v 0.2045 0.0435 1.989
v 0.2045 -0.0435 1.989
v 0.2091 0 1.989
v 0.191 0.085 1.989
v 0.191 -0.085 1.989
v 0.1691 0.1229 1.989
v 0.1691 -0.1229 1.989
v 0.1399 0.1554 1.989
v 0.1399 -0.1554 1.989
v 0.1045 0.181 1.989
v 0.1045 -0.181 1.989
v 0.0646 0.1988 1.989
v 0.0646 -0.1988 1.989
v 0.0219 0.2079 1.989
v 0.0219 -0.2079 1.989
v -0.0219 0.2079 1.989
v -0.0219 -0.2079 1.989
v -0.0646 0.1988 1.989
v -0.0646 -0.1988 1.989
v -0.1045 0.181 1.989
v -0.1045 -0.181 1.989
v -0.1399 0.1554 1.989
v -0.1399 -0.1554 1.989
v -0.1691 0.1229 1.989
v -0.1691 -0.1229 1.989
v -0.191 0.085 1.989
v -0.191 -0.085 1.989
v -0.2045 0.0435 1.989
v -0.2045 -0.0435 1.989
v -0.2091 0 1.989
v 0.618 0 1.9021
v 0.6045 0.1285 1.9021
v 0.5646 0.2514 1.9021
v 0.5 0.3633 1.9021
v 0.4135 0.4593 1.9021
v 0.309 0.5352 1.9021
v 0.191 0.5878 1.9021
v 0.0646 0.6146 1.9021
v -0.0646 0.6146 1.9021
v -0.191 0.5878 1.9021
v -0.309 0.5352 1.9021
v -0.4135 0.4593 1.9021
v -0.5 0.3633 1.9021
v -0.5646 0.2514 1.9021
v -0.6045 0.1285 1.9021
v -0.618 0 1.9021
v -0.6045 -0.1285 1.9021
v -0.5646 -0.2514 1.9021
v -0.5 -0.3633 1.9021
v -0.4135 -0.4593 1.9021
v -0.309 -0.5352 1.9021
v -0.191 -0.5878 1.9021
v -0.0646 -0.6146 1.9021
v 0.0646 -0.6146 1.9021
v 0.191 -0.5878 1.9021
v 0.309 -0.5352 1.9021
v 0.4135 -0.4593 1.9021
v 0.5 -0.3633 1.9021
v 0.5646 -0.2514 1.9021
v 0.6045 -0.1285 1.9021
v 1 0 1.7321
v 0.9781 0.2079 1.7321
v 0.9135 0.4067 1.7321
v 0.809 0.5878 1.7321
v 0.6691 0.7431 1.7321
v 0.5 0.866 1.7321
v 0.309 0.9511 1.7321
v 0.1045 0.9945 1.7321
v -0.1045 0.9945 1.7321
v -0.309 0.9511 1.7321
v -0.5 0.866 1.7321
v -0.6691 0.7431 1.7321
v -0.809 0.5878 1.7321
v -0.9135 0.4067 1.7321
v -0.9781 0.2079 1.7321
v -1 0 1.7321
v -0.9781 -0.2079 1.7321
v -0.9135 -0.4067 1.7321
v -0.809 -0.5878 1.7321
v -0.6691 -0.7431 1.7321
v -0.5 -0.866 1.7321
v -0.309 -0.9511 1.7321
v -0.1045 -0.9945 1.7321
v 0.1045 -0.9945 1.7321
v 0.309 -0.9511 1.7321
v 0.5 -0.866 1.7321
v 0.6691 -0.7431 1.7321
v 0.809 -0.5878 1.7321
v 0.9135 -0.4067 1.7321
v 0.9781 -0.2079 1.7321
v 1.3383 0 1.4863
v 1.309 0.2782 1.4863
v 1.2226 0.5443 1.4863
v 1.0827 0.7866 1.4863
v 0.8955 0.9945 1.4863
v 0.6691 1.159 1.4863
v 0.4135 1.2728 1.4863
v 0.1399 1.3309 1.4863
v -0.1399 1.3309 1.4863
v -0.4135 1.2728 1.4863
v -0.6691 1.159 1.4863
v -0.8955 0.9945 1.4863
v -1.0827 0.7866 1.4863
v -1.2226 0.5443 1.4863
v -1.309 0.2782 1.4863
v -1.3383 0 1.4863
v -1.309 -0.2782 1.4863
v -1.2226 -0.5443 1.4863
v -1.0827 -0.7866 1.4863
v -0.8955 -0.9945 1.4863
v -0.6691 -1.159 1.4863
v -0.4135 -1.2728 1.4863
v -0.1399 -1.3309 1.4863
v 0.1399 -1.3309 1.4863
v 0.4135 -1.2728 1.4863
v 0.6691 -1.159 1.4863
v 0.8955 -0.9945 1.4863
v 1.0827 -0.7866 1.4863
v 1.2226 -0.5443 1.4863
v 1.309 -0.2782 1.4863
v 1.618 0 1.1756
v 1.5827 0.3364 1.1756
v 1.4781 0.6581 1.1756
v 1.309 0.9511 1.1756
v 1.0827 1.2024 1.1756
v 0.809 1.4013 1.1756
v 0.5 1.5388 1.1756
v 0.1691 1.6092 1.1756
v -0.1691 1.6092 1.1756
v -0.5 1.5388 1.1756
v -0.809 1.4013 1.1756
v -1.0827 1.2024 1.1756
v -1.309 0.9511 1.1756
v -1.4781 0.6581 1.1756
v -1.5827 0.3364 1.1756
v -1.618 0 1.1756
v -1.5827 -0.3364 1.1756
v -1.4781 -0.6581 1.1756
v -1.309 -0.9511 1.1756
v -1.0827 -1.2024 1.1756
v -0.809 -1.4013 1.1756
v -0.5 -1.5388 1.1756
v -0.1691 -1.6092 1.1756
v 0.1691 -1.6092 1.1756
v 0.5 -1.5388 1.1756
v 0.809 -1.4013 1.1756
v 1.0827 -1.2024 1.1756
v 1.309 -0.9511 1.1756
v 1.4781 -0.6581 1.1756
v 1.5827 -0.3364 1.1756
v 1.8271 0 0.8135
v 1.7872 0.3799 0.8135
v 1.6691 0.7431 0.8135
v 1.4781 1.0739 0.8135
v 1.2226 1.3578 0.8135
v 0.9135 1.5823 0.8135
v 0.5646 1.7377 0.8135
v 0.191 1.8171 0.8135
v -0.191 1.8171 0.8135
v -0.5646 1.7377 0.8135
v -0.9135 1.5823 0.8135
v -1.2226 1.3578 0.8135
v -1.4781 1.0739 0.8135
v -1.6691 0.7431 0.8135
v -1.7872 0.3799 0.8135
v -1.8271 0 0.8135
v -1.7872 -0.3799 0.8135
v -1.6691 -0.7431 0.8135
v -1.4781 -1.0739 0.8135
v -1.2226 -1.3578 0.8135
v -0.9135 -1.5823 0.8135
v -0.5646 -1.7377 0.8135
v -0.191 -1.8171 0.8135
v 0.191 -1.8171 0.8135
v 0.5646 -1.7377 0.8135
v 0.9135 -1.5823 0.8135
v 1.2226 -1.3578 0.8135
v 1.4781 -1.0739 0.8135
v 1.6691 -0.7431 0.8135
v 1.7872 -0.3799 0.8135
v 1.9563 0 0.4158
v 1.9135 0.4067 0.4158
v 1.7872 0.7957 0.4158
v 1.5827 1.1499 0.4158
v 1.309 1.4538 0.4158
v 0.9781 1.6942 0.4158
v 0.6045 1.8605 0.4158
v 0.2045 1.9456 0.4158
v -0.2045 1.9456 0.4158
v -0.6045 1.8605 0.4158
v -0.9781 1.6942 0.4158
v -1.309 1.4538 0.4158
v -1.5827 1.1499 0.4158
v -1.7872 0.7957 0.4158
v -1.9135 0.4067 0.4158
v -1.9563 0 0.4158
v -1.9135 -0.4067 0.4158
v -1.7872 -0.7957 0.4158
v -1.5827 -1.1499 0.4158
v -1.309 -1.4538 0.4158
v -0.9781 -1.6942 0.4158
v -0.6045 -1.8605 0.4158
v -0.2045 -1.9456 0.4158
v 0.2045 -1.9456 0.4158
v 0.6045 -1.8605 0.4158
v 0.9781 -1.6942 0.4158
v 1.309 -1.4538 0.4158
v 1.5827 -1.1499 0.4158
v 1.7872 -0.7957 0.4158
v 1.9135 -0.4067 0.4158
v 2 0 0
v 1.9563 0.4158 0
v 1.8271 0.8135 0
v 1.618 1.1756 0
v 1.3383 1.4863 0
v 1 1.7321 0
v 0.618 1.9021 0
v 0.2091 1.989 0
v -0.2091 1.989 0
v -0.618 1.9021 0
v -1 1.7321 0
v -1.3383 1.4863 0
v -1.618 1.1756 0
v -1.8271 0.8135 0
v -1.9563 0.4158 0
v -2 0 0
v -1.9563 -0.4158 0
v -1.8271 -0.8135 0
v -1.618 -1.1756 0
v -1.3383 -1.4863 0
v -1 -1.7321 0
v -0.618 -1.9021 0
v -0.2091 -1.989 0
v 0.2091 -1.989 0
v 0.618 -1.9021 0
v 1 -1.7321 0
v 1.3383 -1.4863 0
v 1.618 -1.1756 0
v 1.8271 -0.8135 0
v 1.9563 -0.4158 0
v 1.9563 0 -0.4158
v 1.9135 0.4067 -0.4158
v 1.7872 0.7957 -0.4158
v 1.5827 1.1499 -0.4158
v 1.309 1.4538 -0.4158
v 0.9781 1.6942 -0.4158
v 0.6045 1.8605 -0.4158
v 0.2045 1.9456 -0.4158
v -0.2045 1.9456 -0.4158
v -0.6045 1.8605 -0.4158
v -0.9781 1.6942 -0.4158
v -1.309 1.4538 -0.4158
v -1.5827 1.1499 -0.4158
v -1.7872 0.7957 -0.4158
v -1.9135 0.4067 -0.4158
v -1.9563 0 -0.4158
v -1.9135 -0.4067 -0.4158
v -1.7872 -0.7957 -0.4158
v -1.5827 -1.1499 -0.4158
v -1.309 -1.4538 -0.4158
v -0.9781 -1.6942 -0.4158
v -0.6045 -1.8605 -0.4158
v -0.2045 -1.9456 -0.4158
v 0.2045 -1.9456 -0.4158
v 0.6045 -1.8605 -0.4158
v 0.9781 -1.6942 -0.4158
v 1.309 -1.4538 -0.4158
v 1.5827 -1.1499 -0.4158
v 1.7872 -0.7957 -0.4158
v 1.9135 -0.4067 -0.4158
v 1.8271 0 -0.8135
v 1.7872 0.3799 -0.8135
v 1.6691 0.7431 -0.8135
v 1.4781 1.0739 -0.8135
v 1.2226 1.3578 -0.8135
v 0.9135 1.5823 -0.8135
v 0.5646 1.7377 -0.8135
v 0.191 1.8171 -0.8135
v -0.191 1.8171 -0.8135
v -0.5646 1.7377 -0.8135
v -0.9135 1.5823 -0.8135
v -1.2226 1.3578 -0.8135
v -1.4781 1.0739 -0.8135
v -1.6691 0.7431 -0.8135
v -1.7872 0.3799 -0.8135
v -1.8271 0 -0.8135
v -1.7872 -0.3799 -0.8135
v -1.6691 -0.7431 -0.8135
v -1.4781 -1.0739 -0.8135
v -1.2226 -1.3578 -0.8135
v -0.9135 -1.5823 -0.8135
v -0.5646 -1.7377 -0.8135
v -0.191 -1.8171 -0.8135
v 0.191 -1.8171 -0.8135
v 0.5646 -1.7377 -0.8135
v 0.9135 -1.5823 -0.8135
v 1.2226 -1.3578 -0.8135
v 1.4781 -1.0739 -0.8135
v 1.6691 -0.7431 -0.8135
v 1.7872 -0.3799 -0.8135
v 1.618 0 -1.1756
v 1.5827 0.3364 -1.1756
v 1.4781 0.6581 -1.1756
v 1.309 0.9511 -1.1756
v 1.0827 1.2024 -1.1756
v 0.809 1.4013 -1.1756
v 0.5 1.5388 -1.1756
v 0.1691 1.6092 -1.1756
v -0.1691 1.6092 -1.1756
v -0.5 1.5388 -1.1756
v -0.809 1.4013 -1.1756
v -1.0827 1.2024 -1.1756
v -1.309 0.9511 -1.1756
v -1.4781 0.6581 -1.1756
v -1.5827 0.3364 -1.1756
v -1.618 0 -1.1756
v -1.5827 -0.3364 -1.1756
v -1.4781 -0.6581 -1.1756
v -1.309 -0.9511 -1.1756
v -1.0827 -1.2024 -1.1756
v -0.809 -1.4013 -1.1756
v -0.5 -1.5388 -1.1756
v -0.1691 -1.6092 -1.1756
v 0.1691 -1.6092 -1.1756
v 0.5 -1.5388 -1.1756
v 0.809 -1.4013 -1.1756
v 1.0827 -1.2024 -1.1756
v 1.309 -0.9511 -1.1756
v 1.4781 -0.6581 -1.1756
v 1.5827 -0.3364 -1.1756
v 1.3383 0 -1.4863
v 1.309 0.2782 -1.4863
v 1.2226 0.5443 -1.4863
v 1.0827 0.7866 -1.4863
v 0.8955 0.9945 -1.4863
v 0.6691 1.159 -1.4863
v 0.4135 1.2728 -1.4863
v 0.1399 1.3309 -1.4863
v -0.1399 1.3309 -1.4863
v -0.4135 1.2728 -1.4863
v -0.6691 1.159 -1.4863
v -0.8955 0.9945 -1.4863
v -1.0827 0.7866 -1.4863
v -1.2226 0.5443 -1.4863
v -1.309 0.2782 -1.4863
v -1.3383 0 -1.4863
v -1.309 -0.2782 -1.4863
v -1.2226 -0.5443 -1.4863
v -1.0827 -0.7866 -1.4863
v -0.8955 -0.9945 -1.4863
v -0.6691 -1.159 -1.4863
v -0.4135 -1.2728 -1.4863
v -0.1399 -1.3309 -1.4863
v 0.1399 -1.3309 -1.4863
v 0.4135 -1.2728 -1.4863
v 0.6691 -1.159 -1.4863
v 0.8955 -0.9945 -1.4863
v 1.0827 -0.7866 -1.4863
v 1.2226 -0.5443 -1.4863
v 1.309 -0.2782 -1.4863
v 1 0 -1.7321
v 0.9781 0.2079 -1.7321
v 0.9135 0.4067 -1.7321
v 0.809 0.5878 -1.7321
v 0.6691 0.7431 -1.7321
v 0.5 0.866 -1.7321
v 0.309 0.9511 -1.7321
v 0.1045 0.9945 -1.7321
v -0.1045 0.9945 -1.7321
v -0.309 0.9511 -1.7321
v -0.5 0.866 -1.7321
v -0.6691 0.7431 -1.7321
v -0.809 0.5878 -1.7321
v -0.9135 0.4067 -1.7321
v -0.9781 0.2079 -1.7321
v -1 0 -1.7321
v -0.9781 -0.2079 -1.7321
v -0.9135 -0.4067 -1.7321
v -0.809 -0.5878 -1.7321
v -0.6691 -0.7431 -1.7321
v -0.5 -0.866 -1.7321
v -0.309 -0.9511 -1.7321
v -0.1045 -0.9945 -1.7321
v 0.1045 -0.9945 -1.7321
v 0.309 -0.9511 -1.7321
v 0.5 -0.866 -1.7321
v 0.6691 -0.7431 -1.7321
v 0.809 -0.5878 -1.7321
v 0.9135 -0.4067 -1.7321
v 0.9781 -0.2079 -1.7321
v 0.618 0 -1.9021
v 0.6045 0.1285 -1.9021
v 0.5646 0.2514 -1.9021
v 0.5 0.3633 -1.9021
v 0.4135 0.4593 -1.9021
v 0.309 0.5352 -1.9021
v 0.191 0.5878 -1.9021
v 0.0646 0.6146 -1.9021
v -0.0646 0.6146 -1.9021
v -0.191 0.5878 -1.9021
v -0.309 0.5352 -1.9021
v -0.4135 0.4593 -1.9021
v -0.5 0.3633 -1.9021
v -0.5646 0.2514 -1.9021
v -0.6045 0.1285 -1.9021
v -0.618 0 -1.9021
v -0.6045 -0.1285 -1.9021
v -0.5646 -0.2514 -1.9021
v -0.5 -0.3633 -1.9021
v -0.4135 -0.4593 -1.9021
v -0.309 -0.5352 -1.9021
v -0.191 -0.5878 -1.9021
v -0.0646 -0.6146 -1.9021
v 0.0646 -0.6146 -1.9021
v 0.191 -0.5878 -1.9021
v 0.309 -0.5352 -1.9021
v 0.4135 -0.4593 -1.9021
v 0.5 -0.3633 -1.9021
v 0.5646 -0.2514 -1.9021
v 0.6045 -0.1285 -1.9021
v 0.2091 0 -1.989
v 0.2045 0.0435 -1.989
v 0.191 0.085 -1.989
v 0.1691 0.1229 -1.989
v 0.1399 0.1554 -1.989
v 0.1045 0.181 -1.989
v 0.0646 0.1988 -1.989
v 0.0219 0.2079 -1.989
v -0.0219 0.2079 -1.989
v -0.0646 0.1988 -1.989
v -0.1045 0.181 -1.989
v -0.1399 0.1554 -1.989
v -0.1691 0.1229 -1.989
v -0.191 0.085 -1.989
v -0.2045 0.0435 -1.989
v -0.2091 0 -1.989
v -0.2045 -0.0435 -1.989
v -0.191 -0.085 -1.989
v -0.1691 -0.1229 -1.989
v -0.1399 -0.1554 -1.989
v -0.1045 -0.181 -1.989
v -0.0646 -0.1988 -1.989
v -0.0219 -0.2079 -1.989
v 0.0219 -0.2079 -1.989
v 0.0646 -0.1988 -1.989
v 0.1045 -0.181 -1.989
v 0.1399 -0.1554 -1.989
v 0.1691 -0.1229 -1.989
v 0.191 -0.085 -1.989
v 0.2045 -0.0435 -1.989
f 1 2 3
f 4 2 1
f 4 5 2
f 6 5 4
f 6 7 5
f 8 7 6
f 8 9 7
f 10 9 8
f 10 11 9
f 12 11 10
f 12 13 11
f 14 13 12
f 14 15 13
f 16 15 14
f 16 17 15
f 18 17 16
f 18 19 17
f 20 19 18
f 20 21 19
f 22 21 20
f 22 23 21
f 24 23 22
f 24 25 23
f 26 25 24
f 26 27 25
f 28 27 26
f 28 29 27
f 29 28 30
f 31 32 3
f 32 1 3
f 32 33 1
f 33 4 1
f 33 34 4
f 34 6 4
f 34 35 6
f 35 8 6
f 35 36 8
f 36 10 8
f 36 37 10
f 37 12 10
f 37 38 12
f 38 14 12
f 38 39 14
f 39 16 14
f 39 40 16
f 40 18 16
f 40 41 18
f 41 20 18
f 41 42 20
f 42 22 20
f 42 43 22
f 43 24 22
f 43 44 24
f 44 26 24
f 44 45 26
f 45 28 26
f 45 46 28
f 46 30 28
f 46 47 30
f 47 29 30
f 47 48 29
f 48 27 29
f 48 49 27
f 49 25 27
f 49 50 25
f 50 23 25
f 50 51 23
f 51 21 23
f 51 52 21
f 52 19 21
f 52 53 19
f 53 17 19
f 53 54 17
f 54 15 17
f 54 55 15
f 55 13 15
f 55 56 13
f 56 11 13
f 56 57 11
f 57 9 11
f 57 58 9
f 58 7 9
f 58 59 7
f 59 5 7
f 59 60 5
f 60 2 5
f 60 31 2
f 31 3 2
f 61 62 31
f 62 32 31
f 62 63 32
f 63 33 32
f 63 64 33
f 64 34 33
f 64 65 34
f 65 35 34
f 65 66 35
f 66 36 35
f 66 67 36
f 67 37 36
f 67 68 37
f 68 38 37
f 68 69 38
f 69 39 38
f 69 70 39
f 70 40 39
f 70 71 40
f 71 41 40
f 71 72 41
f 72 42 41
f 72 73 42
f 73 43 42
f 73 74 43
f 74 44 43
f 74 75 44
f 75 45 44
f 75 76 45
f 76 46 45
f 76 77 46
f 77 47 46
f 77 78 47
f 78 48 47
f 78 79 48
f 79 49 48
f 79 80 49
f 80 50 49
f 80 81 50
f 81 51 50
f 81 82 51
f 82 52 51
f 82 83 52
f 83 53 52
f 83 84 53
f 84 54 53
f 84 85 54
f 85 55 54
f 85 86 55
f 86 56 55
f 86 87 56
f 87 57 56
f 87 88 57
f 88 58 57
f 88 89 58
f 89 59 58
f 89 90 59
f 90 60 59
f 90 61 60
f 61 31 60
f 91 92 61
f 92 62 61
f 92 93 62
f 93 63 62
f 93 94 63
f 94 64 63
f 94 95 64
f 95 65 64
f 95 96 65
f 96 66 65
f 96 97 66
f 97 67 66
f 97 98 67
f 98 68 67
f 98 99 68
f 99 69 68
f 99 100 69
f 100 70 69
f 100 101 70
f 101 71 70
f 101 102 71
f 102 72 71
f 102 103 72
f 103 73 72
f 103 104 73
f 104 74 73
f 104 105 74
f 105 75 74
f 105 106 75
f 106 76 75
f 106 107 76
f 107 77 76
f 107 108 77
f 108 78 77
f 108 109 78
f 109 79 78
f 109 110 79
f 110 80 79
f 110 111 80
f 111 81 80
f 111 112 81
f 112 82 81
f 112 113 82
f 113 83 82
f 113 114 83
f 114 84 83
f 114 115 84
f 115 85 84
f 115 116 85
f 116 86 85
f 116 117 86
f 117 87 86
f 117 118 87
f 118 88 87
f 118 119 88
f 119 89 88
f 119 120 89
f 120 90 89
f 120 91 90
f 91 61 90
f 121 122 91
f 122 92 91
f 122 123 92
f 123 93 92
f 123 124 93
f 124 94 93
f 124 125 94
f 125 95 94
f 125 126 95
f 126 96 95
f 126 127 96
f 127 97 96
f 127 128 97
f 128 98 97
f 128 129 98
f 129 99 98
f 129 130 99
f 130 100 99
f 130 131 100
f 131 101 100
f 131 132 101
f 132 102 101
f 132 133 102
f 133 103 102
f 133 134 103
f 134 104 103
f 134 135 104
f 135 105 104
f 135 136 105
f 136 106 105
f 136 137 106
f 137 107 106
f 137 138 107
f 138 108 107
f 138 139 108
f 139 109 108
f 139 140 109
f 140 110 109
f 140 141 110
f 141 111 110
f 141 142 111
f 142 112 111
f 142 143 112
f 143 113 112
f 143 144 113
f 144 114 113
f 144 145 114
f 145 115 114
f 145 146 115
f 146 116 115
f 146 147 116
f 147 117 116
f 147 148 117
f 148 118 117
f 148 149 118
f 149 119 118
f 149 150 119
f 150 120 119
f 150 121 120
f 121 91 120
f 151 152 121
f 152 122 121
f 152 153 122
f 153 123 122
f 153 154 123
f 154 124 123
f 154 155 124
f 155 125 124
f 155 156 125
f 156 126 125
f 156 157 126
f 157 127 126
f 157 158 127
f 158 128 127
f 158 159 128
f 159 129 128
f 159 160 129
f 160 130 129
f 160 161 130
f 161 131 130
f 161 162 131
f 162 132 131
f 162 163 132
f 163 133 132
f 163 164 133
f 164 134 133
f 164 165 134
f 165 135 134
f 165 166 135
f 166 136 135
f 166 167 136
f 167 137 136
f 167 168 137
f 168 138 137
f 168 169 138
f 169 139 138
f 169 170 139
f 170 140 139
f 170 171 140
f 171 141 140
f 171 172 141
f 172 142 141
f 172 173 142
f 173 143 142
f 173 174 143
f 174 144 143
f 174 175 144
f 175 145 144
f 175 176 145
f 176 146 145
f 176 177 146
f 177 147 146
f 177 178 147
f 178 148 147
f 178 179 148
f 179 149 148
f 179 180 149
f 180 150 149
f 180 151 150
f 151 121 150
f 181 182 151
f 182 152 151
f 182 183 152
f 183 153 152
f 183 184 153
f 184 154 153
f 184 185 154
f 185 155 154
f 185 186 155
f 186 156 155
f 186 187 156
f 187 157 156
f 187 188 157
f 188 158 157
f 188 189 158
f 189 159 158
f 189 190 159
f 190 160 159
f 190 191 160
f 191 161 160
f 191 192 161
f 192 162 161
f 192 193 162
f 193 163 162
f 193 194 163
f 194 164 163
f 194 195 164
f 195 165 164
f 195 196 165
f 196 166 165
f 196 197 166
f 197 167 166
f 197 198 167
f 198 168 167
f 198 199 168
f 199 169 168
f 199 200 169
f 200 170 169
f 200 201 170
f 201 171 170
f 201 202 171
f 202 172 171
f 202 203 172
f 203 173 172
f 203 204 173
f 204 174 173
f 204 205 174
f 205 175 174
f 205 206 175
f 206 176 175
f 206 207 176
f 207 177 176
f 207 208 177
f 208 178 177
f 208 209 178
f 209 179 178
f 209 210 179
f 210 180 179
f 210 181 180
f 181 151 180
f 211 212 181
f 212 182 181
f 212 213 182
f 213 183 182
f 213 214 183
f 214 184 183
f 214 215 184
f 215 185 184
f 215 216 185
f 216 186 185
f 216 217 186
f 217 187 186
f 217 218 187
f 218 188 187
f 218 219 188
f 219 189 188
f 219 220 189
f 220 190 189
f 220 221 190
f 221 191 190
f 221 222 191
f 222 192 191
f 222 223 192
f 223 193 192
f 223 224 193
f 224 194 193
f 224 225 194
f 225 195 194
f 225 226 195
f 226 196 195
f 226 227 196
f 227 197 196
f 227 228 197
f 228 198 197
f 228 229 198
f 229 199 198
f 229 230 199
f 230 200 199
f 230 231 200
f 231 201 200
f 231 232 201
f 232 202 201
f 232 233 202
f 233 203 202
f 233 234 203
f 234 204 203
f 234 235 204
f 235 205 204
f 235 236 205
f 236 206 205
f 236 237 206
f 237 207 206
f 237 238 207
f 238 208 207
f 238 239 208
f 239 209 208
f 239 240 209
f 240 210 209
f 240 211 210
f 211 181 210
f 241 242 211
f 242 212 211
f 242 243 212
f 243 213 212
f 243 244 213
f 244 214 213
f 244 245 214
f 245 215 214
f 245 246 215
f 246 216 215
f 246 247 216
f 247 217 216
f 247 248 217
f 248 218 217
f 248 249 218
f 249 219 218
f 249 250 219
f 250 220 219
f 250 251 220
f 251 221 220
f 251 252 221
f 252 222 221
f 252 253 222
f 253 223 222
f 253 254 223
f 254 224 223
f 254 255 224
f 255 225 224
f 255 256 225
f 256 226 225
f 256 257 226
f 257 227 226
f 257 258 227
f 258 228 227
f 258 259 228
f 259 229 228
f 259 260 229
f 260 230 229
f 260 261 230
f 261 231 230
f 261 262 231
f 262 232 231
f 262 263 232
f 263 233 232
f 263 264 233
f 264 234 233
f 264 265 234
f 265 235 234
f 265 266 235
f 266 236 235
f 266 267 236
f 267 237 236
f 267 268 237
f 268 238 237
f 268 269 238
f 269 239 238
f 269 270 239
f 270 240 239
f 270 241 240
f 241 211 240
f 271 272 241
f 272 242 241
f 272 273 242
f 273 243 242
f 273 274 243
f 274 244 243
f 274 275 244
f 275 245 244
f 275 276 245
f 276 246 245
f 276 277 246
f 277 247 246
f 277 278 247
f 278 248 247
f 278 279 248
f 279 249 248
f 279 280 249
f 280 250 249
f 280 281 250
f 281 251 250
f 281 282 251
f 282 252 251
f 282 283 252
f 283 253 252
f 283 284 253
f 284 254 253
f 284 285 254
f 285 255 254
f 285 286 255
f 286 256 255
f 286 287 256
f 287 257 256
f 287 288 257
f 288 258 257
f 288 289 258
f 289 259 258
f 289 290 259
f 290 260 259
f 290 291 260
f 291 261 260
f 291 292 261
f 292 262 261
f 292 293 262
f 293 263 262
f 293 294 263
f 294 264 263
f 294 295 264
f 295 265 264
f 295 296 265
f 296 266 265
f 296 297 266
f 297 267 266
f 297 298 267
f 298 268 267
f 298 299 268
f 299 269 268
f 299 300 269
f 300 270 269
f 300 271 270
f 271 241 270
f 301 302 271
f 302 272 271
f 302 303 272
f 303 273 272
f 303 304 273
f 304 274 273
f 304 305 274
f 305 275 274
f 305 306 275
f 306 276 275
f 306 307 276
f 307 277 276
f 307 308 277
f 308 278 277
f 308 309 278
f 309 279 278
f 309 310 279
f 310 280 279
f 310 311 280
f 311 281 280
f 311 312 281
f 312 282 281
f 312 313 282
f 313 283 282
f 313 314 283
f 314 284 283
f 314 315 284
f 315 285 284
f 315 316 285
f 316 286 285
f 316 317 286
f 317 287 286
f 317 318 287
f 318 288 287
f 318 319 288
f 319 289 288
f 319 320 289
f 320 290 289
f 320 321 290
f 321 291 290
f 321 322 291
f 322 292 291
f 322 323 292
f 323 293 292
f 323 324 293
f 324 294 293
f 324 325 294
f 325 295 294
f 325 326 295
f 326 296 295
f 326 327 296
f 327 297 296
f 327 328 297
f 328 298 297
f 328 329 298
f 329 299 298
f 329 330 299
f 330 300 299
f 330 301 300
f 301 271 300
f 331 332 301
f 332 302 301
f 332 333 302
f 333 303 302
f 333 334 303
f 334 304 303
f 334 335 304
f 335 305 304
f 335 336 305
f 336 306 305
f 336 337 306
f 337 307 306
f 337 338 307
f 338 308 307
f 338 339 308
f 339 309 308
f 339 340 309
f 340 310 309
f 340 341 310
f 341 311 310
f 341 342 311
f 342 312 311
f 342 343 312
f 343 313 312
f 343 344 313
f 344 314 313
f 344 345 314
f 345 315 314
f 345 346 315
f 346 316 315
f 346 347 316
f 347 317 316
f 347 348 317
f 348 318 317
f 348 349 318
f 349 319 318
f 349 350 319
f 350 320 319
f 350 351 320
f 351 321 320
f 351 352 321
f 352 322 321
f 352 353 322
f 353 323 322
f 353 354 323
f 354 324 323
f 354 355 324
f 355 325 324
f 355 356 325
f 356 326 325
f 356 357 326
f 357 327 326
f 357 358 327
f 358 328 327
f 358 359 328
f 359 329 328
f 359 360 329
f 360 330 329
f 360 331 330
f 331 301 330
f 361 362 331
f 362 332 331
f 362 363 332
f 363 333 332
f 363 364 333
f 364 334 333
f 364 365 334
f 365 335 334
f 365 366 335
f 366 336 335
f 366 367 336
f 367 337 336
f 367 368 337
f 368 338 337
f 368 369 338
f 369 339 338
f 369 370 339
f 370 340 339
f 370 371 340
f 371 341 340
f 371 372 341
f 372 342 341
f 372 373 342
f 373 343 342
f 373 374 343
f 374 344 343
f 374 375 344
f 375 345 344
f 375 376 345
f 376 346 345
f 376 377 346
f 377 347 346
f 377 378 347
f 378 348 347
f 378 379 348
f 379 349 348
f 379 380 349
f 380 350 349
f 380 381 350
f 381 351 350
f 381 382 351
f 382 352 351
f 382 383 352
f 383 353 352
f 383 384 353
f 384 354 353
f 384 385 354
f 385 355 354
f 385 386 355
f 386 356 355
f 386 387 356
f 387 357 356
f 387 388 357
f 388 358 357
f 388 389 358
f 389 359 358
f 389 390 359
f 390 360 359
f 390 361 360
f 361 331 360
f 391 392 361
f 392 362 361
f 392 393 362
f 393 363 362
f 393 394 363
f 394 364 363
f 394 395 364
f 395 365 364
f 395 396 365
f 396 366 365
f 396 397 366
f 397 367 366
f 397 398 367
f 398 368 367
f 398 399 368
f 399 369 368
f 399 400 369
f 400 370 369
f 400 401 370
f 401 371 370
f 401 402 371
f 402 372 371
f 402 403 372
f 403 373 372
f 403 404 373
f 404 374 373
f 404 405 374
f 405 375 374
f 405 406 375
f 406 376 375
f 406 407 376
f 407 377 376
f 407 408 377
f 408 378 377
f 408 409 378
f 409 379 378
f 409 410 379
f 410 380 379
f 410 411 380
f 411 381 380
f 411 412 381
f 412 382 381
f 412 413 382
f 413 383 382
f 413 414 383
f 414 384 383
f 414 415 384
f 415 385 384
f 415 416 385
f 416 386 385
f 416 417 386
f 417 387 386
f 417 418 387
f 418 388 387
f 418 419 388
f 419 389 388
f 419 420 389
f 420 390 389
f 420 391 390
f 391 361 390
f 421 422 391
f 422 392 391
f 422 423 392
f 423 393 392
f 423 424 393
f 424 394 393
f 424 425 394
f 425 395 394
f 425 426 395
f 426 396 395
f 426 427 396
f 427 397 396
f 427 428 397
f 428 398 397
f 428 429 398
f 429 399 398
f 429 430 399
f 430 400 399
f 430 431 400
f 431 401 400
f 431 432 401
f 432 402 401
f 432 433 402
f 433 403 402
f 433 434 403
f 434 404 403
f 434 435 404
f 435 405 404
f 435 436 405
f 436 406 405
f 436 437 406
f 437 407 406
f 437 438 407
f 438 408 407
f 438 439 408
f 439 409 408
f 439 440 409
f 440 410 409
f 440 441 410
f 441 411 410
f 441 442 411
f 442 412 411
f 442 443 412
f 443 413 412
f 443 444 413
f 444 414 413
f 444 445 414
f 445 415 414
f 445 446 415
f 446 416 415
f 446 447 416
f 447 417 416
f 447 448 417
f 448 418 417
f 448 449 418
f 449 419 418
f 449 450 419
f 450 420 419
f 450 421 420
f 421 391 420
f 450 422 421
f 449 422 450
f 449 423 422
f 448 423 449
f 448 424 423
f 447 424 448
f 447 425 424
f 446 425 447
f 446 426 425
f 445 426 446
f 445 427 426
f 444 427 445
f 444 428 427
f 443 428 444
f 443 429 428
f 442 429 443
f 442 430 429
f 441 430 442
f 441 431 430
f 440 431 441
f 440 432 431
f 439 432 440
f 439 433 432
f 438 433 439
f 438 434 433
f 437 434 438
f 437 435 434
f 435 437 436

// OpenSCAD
$fs=0.11;
translate ([0, 0, 10*sin($t*360)])
sphere(2);

rotate ([0, 0, $t*360])

square(5);

//https://en.wikibooks.org/wiki/OpenSCAD_User_Manual/Other_Language_Features#$fn
